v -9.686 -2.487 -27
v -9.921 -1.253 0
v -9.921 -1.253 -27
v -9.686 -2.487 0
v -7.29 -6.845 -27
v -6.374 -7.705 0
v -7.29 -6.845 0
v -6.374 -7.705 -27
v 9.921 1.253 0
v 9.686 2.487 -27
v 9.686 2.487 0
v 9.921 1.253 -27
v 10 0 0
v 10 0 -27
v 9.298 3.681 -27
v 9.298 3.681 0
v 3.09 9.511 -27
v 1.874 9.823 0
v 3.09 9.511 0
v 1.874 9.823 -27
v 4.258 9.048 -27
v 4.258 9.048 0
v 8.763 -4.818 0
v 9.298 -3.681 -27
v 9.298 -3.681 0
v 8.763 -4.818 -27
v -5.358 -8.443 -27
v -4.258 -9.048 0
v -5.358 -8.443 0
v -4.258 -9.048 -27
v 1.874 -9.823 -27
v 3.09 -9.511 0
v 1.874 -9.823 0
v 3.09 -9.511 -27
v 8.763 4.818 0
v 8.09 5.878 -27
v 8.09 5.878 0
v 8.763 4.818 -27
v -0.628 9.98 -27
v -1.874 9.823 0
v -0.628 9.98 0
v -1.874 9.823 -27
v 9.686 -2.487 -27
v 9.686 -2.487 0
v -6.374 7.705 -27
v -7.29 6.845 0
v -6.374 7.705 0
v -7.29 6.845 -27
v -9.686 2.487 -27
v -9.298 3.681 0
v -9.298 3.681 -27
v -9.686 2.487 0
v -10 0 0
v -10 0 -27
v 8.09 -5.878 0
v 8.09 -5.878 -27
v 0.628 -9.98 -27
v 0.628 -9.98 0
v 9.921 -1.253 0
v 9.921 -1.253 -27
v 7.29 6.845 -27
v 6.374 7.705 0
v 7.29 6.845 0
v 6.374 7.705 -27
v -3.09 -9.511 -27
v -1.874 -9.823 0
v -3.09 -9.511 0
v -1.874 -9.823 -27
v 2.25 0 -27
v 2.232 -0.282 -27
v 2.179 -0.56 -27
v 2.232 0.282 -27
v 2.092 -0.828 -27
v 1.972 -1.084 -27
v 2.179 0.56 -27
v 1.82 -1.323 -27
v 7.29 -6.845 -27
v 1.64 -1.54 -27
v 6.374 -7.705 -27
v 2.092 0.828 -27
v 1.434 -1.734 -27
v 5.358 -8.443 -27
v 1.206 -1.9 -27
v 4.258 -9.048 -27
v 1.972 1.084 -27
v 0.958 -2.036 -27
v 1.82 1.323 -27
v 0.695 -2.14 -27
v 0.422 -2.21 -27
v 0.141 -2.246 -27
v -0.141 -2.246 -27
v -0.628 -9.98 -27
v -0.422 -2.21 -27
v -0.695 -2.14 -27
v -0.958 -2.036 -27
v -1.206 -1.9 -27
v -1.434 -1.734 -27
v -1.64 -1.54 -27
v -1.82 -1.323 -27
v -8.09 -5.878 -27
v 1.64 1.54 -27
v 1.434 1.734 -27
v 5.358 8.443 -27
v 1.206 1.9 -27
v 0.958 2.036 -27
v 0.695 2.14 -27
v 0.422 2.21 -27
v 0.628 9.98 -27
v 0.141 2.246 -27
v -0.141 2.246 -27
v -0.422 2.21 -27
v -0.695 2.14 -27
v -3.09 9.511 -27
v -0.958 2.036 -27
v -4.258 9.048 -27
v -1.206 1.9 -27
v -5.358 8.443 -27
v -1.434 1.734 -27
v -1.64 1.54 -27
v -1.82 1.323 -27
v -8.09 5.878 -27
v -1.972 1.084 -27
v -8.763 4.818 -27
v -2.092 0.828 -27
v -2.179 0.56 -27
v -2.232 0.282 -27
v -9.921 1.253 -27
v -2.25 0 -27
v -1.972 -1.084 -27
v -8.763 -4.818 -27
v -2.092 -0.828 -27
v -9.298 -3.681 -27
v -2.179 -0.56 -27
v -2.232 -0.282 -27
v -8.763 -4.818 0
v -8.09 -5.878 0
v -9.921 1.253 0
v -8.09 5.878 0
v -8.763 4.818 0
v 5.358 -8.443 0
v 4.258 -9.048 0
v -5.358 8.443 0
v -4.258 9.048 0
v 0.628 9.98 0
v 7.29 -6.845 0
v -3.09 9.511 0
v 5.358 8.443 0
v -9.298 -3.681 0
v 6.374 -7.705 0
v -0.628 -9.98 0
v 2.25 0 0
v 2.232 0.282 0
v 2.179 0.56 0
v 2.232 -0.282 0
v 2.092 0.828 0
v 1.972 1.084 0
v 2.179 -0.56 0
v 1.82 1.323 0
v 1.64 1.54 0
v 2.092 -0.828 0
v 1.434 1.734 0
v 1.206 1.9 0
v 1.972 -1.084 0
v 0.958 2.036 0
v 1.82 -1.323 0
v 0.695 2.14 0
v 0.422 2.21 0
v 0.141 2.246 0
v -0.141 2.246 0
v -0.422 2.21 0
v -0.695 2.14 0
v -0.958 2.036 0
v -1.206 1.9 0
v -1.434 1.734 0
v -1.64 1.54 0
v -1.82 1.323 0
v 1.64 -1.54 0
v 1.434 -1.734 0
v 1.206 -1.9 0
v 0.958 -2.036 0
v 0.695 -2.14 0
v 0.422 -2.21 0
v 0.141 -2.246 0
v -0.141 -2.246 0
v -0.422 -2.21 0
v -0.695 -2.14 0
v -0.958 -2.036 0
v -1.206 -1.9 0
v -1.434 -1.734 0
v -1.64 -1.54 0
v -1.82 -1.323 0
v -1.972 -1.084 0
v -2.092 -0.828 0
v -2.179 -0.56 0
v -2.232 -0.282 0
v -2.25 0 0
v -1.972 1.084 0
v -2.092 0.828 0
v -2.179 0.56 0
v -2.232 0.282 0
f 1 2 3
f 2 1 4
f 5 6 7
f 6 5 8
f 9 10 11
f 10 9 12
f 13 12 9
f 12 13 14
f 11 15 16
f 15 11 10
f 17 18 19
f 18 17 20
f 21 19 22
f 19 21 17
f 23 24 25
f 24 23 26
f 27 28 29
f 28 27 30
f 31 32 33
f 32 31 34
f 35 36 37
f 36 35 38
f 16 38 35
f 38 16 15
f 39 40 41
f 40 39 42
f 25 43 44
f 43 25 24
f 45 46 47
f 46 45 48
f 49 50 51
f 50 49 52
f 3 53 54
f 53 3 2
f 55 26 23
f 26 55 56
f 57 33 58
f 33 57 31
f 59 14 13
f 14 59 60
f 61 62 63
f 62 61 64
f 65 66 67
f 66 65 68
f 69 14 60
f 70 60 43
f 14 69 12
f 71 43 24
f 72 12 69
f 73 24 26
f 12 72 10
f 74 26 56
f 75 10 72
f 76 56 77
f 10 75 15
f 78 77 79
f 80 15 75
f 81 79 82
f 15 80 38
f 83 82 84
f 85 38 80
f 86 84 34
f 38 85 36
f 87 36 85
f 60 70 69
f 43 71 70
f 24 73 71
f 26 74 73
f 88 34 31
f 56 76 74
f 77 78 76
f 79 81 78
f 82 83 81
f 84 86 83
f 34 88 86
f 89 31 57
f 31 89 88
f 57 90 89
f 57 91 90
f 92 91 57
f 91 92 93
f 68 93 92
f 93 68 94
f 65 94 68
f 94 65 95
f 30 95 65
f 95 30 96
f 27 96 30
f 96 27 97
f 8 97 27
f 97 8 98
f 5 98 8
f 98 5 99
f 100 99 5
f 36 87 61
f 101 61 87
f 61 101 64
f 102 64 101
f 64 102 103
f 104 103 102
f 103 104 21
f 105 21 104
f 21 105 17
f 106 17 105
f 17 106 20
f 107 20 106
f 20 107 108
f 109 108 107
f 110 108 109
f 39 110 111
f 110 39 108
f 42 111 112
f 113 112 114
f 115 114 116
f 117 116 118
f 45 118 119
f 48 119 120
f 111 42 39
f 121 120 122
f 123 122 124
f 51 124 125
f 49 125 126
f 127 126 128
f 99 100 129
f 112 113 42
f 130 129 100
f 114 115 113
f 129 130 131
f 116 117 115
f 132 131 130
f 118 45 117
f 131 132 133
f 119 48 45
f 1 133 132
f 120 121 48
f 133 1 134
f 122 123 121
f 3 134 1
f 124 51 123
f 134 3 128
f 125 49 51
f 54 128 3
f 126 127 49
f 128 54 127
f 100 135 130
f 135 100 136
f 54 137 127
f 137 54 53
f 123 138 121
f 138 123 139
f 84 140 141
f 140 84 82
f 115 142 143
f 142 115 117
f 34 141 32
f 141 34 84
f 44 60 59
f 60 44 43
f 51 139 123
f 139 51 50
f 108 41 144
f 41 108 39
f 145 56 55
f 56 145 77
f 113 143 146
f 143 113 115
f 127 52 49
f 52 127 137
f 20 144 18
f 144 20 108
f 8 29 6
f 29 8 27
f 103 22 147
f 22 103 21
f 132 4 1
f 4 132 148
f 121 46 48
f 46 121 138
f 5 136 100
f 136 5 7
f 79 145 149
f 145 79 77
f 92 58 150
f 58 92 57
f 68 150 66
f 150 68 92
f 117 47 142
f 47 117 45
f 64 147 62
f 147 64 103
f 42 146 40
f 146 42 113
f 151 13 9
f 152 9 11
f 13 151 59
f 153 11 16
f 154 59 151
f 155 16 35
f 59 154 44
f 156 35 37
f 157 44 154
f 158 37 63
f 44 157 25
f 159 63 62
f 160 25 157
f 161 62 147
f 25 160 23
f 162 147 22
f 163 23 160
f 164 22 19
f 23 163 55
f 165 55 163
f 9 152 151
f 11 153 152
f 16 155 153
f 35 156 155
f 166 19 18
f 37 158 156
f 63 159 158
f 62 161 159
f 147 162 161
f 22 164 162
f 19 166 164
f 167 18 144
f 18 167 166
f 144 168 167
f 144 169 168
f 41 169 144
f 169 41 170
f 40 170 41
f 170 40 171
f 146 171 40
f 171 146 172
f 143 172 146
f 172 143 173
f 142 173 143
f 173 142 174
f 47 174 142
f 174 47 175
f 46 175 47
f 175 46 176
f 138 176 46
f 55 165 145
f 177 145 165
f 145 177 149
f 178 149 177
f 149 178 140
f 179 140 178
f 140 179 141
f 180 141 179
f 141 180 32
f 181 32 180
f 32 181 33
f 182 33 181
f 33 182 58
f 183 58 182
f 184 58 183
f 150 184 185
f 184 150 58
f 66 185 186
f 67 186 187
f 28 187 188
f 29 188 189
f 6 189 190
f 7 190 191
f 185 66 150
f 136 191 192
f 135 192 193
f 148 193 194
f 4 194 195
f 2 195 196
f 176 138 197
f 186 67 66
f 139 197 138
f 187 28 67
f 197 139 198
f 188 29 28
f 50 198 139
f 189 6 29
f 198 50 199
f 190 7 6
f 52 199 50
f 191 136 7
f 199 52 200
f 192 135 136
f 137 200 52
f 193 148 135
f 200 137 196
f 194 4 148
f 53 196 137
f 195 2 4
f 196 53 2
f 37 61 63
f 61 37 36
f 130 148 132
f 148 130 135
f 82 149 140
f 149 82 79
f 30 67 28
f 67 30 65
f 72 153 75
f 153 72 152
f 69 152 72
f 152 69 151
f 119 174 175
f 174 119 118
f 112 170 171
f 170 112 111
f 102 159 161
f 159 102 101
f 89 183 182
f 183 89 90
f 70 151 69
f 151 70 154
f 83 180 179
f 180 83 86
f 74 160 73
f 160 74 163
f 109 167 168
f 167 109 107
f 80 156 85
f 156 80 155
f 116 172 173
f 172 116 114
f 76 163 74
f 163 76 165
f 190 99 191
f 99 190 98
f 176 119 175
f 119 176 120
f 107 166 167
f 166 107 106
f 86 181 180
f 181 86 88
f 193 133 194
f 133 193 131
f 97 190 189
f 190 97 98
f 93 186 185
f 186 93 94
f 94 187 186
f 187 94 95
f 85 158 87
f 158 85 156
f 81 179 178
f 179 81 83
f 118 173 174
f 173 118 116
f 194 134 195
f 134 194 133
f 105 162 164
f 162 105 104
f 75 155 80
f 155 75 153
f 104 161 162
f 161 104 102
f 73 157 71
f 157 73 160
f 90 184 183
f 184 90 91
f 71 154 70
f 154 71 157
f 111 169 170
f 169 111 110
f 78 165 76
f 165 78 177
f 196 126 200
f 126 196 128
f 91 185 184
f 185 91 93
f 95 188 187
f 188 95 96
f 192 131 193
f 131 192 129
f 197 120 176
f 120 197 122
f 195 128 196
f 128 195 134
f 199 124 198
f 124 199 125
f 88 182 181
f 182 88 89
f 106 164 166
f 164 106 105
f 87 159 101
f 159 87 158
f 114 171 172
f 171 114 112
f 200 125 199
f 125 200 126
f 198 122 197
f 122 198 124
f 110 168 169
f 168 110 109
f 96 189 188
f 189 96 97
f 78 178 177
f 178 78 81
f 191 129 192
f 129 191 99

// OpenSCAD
$fn = 50;


difference() {
	union() {
		translate(v = [0, 0, -27.0000000000]) {
			cylinder(h = 27, r = 10.0000000000);
		}
		cylinder(h = 0, r = 16.0000000000);
	}
	union() {
		#translate(v = [0, 0, -27]) {
			cylinder(h = 27, r = 2.2500000000);
		}
	}
}
